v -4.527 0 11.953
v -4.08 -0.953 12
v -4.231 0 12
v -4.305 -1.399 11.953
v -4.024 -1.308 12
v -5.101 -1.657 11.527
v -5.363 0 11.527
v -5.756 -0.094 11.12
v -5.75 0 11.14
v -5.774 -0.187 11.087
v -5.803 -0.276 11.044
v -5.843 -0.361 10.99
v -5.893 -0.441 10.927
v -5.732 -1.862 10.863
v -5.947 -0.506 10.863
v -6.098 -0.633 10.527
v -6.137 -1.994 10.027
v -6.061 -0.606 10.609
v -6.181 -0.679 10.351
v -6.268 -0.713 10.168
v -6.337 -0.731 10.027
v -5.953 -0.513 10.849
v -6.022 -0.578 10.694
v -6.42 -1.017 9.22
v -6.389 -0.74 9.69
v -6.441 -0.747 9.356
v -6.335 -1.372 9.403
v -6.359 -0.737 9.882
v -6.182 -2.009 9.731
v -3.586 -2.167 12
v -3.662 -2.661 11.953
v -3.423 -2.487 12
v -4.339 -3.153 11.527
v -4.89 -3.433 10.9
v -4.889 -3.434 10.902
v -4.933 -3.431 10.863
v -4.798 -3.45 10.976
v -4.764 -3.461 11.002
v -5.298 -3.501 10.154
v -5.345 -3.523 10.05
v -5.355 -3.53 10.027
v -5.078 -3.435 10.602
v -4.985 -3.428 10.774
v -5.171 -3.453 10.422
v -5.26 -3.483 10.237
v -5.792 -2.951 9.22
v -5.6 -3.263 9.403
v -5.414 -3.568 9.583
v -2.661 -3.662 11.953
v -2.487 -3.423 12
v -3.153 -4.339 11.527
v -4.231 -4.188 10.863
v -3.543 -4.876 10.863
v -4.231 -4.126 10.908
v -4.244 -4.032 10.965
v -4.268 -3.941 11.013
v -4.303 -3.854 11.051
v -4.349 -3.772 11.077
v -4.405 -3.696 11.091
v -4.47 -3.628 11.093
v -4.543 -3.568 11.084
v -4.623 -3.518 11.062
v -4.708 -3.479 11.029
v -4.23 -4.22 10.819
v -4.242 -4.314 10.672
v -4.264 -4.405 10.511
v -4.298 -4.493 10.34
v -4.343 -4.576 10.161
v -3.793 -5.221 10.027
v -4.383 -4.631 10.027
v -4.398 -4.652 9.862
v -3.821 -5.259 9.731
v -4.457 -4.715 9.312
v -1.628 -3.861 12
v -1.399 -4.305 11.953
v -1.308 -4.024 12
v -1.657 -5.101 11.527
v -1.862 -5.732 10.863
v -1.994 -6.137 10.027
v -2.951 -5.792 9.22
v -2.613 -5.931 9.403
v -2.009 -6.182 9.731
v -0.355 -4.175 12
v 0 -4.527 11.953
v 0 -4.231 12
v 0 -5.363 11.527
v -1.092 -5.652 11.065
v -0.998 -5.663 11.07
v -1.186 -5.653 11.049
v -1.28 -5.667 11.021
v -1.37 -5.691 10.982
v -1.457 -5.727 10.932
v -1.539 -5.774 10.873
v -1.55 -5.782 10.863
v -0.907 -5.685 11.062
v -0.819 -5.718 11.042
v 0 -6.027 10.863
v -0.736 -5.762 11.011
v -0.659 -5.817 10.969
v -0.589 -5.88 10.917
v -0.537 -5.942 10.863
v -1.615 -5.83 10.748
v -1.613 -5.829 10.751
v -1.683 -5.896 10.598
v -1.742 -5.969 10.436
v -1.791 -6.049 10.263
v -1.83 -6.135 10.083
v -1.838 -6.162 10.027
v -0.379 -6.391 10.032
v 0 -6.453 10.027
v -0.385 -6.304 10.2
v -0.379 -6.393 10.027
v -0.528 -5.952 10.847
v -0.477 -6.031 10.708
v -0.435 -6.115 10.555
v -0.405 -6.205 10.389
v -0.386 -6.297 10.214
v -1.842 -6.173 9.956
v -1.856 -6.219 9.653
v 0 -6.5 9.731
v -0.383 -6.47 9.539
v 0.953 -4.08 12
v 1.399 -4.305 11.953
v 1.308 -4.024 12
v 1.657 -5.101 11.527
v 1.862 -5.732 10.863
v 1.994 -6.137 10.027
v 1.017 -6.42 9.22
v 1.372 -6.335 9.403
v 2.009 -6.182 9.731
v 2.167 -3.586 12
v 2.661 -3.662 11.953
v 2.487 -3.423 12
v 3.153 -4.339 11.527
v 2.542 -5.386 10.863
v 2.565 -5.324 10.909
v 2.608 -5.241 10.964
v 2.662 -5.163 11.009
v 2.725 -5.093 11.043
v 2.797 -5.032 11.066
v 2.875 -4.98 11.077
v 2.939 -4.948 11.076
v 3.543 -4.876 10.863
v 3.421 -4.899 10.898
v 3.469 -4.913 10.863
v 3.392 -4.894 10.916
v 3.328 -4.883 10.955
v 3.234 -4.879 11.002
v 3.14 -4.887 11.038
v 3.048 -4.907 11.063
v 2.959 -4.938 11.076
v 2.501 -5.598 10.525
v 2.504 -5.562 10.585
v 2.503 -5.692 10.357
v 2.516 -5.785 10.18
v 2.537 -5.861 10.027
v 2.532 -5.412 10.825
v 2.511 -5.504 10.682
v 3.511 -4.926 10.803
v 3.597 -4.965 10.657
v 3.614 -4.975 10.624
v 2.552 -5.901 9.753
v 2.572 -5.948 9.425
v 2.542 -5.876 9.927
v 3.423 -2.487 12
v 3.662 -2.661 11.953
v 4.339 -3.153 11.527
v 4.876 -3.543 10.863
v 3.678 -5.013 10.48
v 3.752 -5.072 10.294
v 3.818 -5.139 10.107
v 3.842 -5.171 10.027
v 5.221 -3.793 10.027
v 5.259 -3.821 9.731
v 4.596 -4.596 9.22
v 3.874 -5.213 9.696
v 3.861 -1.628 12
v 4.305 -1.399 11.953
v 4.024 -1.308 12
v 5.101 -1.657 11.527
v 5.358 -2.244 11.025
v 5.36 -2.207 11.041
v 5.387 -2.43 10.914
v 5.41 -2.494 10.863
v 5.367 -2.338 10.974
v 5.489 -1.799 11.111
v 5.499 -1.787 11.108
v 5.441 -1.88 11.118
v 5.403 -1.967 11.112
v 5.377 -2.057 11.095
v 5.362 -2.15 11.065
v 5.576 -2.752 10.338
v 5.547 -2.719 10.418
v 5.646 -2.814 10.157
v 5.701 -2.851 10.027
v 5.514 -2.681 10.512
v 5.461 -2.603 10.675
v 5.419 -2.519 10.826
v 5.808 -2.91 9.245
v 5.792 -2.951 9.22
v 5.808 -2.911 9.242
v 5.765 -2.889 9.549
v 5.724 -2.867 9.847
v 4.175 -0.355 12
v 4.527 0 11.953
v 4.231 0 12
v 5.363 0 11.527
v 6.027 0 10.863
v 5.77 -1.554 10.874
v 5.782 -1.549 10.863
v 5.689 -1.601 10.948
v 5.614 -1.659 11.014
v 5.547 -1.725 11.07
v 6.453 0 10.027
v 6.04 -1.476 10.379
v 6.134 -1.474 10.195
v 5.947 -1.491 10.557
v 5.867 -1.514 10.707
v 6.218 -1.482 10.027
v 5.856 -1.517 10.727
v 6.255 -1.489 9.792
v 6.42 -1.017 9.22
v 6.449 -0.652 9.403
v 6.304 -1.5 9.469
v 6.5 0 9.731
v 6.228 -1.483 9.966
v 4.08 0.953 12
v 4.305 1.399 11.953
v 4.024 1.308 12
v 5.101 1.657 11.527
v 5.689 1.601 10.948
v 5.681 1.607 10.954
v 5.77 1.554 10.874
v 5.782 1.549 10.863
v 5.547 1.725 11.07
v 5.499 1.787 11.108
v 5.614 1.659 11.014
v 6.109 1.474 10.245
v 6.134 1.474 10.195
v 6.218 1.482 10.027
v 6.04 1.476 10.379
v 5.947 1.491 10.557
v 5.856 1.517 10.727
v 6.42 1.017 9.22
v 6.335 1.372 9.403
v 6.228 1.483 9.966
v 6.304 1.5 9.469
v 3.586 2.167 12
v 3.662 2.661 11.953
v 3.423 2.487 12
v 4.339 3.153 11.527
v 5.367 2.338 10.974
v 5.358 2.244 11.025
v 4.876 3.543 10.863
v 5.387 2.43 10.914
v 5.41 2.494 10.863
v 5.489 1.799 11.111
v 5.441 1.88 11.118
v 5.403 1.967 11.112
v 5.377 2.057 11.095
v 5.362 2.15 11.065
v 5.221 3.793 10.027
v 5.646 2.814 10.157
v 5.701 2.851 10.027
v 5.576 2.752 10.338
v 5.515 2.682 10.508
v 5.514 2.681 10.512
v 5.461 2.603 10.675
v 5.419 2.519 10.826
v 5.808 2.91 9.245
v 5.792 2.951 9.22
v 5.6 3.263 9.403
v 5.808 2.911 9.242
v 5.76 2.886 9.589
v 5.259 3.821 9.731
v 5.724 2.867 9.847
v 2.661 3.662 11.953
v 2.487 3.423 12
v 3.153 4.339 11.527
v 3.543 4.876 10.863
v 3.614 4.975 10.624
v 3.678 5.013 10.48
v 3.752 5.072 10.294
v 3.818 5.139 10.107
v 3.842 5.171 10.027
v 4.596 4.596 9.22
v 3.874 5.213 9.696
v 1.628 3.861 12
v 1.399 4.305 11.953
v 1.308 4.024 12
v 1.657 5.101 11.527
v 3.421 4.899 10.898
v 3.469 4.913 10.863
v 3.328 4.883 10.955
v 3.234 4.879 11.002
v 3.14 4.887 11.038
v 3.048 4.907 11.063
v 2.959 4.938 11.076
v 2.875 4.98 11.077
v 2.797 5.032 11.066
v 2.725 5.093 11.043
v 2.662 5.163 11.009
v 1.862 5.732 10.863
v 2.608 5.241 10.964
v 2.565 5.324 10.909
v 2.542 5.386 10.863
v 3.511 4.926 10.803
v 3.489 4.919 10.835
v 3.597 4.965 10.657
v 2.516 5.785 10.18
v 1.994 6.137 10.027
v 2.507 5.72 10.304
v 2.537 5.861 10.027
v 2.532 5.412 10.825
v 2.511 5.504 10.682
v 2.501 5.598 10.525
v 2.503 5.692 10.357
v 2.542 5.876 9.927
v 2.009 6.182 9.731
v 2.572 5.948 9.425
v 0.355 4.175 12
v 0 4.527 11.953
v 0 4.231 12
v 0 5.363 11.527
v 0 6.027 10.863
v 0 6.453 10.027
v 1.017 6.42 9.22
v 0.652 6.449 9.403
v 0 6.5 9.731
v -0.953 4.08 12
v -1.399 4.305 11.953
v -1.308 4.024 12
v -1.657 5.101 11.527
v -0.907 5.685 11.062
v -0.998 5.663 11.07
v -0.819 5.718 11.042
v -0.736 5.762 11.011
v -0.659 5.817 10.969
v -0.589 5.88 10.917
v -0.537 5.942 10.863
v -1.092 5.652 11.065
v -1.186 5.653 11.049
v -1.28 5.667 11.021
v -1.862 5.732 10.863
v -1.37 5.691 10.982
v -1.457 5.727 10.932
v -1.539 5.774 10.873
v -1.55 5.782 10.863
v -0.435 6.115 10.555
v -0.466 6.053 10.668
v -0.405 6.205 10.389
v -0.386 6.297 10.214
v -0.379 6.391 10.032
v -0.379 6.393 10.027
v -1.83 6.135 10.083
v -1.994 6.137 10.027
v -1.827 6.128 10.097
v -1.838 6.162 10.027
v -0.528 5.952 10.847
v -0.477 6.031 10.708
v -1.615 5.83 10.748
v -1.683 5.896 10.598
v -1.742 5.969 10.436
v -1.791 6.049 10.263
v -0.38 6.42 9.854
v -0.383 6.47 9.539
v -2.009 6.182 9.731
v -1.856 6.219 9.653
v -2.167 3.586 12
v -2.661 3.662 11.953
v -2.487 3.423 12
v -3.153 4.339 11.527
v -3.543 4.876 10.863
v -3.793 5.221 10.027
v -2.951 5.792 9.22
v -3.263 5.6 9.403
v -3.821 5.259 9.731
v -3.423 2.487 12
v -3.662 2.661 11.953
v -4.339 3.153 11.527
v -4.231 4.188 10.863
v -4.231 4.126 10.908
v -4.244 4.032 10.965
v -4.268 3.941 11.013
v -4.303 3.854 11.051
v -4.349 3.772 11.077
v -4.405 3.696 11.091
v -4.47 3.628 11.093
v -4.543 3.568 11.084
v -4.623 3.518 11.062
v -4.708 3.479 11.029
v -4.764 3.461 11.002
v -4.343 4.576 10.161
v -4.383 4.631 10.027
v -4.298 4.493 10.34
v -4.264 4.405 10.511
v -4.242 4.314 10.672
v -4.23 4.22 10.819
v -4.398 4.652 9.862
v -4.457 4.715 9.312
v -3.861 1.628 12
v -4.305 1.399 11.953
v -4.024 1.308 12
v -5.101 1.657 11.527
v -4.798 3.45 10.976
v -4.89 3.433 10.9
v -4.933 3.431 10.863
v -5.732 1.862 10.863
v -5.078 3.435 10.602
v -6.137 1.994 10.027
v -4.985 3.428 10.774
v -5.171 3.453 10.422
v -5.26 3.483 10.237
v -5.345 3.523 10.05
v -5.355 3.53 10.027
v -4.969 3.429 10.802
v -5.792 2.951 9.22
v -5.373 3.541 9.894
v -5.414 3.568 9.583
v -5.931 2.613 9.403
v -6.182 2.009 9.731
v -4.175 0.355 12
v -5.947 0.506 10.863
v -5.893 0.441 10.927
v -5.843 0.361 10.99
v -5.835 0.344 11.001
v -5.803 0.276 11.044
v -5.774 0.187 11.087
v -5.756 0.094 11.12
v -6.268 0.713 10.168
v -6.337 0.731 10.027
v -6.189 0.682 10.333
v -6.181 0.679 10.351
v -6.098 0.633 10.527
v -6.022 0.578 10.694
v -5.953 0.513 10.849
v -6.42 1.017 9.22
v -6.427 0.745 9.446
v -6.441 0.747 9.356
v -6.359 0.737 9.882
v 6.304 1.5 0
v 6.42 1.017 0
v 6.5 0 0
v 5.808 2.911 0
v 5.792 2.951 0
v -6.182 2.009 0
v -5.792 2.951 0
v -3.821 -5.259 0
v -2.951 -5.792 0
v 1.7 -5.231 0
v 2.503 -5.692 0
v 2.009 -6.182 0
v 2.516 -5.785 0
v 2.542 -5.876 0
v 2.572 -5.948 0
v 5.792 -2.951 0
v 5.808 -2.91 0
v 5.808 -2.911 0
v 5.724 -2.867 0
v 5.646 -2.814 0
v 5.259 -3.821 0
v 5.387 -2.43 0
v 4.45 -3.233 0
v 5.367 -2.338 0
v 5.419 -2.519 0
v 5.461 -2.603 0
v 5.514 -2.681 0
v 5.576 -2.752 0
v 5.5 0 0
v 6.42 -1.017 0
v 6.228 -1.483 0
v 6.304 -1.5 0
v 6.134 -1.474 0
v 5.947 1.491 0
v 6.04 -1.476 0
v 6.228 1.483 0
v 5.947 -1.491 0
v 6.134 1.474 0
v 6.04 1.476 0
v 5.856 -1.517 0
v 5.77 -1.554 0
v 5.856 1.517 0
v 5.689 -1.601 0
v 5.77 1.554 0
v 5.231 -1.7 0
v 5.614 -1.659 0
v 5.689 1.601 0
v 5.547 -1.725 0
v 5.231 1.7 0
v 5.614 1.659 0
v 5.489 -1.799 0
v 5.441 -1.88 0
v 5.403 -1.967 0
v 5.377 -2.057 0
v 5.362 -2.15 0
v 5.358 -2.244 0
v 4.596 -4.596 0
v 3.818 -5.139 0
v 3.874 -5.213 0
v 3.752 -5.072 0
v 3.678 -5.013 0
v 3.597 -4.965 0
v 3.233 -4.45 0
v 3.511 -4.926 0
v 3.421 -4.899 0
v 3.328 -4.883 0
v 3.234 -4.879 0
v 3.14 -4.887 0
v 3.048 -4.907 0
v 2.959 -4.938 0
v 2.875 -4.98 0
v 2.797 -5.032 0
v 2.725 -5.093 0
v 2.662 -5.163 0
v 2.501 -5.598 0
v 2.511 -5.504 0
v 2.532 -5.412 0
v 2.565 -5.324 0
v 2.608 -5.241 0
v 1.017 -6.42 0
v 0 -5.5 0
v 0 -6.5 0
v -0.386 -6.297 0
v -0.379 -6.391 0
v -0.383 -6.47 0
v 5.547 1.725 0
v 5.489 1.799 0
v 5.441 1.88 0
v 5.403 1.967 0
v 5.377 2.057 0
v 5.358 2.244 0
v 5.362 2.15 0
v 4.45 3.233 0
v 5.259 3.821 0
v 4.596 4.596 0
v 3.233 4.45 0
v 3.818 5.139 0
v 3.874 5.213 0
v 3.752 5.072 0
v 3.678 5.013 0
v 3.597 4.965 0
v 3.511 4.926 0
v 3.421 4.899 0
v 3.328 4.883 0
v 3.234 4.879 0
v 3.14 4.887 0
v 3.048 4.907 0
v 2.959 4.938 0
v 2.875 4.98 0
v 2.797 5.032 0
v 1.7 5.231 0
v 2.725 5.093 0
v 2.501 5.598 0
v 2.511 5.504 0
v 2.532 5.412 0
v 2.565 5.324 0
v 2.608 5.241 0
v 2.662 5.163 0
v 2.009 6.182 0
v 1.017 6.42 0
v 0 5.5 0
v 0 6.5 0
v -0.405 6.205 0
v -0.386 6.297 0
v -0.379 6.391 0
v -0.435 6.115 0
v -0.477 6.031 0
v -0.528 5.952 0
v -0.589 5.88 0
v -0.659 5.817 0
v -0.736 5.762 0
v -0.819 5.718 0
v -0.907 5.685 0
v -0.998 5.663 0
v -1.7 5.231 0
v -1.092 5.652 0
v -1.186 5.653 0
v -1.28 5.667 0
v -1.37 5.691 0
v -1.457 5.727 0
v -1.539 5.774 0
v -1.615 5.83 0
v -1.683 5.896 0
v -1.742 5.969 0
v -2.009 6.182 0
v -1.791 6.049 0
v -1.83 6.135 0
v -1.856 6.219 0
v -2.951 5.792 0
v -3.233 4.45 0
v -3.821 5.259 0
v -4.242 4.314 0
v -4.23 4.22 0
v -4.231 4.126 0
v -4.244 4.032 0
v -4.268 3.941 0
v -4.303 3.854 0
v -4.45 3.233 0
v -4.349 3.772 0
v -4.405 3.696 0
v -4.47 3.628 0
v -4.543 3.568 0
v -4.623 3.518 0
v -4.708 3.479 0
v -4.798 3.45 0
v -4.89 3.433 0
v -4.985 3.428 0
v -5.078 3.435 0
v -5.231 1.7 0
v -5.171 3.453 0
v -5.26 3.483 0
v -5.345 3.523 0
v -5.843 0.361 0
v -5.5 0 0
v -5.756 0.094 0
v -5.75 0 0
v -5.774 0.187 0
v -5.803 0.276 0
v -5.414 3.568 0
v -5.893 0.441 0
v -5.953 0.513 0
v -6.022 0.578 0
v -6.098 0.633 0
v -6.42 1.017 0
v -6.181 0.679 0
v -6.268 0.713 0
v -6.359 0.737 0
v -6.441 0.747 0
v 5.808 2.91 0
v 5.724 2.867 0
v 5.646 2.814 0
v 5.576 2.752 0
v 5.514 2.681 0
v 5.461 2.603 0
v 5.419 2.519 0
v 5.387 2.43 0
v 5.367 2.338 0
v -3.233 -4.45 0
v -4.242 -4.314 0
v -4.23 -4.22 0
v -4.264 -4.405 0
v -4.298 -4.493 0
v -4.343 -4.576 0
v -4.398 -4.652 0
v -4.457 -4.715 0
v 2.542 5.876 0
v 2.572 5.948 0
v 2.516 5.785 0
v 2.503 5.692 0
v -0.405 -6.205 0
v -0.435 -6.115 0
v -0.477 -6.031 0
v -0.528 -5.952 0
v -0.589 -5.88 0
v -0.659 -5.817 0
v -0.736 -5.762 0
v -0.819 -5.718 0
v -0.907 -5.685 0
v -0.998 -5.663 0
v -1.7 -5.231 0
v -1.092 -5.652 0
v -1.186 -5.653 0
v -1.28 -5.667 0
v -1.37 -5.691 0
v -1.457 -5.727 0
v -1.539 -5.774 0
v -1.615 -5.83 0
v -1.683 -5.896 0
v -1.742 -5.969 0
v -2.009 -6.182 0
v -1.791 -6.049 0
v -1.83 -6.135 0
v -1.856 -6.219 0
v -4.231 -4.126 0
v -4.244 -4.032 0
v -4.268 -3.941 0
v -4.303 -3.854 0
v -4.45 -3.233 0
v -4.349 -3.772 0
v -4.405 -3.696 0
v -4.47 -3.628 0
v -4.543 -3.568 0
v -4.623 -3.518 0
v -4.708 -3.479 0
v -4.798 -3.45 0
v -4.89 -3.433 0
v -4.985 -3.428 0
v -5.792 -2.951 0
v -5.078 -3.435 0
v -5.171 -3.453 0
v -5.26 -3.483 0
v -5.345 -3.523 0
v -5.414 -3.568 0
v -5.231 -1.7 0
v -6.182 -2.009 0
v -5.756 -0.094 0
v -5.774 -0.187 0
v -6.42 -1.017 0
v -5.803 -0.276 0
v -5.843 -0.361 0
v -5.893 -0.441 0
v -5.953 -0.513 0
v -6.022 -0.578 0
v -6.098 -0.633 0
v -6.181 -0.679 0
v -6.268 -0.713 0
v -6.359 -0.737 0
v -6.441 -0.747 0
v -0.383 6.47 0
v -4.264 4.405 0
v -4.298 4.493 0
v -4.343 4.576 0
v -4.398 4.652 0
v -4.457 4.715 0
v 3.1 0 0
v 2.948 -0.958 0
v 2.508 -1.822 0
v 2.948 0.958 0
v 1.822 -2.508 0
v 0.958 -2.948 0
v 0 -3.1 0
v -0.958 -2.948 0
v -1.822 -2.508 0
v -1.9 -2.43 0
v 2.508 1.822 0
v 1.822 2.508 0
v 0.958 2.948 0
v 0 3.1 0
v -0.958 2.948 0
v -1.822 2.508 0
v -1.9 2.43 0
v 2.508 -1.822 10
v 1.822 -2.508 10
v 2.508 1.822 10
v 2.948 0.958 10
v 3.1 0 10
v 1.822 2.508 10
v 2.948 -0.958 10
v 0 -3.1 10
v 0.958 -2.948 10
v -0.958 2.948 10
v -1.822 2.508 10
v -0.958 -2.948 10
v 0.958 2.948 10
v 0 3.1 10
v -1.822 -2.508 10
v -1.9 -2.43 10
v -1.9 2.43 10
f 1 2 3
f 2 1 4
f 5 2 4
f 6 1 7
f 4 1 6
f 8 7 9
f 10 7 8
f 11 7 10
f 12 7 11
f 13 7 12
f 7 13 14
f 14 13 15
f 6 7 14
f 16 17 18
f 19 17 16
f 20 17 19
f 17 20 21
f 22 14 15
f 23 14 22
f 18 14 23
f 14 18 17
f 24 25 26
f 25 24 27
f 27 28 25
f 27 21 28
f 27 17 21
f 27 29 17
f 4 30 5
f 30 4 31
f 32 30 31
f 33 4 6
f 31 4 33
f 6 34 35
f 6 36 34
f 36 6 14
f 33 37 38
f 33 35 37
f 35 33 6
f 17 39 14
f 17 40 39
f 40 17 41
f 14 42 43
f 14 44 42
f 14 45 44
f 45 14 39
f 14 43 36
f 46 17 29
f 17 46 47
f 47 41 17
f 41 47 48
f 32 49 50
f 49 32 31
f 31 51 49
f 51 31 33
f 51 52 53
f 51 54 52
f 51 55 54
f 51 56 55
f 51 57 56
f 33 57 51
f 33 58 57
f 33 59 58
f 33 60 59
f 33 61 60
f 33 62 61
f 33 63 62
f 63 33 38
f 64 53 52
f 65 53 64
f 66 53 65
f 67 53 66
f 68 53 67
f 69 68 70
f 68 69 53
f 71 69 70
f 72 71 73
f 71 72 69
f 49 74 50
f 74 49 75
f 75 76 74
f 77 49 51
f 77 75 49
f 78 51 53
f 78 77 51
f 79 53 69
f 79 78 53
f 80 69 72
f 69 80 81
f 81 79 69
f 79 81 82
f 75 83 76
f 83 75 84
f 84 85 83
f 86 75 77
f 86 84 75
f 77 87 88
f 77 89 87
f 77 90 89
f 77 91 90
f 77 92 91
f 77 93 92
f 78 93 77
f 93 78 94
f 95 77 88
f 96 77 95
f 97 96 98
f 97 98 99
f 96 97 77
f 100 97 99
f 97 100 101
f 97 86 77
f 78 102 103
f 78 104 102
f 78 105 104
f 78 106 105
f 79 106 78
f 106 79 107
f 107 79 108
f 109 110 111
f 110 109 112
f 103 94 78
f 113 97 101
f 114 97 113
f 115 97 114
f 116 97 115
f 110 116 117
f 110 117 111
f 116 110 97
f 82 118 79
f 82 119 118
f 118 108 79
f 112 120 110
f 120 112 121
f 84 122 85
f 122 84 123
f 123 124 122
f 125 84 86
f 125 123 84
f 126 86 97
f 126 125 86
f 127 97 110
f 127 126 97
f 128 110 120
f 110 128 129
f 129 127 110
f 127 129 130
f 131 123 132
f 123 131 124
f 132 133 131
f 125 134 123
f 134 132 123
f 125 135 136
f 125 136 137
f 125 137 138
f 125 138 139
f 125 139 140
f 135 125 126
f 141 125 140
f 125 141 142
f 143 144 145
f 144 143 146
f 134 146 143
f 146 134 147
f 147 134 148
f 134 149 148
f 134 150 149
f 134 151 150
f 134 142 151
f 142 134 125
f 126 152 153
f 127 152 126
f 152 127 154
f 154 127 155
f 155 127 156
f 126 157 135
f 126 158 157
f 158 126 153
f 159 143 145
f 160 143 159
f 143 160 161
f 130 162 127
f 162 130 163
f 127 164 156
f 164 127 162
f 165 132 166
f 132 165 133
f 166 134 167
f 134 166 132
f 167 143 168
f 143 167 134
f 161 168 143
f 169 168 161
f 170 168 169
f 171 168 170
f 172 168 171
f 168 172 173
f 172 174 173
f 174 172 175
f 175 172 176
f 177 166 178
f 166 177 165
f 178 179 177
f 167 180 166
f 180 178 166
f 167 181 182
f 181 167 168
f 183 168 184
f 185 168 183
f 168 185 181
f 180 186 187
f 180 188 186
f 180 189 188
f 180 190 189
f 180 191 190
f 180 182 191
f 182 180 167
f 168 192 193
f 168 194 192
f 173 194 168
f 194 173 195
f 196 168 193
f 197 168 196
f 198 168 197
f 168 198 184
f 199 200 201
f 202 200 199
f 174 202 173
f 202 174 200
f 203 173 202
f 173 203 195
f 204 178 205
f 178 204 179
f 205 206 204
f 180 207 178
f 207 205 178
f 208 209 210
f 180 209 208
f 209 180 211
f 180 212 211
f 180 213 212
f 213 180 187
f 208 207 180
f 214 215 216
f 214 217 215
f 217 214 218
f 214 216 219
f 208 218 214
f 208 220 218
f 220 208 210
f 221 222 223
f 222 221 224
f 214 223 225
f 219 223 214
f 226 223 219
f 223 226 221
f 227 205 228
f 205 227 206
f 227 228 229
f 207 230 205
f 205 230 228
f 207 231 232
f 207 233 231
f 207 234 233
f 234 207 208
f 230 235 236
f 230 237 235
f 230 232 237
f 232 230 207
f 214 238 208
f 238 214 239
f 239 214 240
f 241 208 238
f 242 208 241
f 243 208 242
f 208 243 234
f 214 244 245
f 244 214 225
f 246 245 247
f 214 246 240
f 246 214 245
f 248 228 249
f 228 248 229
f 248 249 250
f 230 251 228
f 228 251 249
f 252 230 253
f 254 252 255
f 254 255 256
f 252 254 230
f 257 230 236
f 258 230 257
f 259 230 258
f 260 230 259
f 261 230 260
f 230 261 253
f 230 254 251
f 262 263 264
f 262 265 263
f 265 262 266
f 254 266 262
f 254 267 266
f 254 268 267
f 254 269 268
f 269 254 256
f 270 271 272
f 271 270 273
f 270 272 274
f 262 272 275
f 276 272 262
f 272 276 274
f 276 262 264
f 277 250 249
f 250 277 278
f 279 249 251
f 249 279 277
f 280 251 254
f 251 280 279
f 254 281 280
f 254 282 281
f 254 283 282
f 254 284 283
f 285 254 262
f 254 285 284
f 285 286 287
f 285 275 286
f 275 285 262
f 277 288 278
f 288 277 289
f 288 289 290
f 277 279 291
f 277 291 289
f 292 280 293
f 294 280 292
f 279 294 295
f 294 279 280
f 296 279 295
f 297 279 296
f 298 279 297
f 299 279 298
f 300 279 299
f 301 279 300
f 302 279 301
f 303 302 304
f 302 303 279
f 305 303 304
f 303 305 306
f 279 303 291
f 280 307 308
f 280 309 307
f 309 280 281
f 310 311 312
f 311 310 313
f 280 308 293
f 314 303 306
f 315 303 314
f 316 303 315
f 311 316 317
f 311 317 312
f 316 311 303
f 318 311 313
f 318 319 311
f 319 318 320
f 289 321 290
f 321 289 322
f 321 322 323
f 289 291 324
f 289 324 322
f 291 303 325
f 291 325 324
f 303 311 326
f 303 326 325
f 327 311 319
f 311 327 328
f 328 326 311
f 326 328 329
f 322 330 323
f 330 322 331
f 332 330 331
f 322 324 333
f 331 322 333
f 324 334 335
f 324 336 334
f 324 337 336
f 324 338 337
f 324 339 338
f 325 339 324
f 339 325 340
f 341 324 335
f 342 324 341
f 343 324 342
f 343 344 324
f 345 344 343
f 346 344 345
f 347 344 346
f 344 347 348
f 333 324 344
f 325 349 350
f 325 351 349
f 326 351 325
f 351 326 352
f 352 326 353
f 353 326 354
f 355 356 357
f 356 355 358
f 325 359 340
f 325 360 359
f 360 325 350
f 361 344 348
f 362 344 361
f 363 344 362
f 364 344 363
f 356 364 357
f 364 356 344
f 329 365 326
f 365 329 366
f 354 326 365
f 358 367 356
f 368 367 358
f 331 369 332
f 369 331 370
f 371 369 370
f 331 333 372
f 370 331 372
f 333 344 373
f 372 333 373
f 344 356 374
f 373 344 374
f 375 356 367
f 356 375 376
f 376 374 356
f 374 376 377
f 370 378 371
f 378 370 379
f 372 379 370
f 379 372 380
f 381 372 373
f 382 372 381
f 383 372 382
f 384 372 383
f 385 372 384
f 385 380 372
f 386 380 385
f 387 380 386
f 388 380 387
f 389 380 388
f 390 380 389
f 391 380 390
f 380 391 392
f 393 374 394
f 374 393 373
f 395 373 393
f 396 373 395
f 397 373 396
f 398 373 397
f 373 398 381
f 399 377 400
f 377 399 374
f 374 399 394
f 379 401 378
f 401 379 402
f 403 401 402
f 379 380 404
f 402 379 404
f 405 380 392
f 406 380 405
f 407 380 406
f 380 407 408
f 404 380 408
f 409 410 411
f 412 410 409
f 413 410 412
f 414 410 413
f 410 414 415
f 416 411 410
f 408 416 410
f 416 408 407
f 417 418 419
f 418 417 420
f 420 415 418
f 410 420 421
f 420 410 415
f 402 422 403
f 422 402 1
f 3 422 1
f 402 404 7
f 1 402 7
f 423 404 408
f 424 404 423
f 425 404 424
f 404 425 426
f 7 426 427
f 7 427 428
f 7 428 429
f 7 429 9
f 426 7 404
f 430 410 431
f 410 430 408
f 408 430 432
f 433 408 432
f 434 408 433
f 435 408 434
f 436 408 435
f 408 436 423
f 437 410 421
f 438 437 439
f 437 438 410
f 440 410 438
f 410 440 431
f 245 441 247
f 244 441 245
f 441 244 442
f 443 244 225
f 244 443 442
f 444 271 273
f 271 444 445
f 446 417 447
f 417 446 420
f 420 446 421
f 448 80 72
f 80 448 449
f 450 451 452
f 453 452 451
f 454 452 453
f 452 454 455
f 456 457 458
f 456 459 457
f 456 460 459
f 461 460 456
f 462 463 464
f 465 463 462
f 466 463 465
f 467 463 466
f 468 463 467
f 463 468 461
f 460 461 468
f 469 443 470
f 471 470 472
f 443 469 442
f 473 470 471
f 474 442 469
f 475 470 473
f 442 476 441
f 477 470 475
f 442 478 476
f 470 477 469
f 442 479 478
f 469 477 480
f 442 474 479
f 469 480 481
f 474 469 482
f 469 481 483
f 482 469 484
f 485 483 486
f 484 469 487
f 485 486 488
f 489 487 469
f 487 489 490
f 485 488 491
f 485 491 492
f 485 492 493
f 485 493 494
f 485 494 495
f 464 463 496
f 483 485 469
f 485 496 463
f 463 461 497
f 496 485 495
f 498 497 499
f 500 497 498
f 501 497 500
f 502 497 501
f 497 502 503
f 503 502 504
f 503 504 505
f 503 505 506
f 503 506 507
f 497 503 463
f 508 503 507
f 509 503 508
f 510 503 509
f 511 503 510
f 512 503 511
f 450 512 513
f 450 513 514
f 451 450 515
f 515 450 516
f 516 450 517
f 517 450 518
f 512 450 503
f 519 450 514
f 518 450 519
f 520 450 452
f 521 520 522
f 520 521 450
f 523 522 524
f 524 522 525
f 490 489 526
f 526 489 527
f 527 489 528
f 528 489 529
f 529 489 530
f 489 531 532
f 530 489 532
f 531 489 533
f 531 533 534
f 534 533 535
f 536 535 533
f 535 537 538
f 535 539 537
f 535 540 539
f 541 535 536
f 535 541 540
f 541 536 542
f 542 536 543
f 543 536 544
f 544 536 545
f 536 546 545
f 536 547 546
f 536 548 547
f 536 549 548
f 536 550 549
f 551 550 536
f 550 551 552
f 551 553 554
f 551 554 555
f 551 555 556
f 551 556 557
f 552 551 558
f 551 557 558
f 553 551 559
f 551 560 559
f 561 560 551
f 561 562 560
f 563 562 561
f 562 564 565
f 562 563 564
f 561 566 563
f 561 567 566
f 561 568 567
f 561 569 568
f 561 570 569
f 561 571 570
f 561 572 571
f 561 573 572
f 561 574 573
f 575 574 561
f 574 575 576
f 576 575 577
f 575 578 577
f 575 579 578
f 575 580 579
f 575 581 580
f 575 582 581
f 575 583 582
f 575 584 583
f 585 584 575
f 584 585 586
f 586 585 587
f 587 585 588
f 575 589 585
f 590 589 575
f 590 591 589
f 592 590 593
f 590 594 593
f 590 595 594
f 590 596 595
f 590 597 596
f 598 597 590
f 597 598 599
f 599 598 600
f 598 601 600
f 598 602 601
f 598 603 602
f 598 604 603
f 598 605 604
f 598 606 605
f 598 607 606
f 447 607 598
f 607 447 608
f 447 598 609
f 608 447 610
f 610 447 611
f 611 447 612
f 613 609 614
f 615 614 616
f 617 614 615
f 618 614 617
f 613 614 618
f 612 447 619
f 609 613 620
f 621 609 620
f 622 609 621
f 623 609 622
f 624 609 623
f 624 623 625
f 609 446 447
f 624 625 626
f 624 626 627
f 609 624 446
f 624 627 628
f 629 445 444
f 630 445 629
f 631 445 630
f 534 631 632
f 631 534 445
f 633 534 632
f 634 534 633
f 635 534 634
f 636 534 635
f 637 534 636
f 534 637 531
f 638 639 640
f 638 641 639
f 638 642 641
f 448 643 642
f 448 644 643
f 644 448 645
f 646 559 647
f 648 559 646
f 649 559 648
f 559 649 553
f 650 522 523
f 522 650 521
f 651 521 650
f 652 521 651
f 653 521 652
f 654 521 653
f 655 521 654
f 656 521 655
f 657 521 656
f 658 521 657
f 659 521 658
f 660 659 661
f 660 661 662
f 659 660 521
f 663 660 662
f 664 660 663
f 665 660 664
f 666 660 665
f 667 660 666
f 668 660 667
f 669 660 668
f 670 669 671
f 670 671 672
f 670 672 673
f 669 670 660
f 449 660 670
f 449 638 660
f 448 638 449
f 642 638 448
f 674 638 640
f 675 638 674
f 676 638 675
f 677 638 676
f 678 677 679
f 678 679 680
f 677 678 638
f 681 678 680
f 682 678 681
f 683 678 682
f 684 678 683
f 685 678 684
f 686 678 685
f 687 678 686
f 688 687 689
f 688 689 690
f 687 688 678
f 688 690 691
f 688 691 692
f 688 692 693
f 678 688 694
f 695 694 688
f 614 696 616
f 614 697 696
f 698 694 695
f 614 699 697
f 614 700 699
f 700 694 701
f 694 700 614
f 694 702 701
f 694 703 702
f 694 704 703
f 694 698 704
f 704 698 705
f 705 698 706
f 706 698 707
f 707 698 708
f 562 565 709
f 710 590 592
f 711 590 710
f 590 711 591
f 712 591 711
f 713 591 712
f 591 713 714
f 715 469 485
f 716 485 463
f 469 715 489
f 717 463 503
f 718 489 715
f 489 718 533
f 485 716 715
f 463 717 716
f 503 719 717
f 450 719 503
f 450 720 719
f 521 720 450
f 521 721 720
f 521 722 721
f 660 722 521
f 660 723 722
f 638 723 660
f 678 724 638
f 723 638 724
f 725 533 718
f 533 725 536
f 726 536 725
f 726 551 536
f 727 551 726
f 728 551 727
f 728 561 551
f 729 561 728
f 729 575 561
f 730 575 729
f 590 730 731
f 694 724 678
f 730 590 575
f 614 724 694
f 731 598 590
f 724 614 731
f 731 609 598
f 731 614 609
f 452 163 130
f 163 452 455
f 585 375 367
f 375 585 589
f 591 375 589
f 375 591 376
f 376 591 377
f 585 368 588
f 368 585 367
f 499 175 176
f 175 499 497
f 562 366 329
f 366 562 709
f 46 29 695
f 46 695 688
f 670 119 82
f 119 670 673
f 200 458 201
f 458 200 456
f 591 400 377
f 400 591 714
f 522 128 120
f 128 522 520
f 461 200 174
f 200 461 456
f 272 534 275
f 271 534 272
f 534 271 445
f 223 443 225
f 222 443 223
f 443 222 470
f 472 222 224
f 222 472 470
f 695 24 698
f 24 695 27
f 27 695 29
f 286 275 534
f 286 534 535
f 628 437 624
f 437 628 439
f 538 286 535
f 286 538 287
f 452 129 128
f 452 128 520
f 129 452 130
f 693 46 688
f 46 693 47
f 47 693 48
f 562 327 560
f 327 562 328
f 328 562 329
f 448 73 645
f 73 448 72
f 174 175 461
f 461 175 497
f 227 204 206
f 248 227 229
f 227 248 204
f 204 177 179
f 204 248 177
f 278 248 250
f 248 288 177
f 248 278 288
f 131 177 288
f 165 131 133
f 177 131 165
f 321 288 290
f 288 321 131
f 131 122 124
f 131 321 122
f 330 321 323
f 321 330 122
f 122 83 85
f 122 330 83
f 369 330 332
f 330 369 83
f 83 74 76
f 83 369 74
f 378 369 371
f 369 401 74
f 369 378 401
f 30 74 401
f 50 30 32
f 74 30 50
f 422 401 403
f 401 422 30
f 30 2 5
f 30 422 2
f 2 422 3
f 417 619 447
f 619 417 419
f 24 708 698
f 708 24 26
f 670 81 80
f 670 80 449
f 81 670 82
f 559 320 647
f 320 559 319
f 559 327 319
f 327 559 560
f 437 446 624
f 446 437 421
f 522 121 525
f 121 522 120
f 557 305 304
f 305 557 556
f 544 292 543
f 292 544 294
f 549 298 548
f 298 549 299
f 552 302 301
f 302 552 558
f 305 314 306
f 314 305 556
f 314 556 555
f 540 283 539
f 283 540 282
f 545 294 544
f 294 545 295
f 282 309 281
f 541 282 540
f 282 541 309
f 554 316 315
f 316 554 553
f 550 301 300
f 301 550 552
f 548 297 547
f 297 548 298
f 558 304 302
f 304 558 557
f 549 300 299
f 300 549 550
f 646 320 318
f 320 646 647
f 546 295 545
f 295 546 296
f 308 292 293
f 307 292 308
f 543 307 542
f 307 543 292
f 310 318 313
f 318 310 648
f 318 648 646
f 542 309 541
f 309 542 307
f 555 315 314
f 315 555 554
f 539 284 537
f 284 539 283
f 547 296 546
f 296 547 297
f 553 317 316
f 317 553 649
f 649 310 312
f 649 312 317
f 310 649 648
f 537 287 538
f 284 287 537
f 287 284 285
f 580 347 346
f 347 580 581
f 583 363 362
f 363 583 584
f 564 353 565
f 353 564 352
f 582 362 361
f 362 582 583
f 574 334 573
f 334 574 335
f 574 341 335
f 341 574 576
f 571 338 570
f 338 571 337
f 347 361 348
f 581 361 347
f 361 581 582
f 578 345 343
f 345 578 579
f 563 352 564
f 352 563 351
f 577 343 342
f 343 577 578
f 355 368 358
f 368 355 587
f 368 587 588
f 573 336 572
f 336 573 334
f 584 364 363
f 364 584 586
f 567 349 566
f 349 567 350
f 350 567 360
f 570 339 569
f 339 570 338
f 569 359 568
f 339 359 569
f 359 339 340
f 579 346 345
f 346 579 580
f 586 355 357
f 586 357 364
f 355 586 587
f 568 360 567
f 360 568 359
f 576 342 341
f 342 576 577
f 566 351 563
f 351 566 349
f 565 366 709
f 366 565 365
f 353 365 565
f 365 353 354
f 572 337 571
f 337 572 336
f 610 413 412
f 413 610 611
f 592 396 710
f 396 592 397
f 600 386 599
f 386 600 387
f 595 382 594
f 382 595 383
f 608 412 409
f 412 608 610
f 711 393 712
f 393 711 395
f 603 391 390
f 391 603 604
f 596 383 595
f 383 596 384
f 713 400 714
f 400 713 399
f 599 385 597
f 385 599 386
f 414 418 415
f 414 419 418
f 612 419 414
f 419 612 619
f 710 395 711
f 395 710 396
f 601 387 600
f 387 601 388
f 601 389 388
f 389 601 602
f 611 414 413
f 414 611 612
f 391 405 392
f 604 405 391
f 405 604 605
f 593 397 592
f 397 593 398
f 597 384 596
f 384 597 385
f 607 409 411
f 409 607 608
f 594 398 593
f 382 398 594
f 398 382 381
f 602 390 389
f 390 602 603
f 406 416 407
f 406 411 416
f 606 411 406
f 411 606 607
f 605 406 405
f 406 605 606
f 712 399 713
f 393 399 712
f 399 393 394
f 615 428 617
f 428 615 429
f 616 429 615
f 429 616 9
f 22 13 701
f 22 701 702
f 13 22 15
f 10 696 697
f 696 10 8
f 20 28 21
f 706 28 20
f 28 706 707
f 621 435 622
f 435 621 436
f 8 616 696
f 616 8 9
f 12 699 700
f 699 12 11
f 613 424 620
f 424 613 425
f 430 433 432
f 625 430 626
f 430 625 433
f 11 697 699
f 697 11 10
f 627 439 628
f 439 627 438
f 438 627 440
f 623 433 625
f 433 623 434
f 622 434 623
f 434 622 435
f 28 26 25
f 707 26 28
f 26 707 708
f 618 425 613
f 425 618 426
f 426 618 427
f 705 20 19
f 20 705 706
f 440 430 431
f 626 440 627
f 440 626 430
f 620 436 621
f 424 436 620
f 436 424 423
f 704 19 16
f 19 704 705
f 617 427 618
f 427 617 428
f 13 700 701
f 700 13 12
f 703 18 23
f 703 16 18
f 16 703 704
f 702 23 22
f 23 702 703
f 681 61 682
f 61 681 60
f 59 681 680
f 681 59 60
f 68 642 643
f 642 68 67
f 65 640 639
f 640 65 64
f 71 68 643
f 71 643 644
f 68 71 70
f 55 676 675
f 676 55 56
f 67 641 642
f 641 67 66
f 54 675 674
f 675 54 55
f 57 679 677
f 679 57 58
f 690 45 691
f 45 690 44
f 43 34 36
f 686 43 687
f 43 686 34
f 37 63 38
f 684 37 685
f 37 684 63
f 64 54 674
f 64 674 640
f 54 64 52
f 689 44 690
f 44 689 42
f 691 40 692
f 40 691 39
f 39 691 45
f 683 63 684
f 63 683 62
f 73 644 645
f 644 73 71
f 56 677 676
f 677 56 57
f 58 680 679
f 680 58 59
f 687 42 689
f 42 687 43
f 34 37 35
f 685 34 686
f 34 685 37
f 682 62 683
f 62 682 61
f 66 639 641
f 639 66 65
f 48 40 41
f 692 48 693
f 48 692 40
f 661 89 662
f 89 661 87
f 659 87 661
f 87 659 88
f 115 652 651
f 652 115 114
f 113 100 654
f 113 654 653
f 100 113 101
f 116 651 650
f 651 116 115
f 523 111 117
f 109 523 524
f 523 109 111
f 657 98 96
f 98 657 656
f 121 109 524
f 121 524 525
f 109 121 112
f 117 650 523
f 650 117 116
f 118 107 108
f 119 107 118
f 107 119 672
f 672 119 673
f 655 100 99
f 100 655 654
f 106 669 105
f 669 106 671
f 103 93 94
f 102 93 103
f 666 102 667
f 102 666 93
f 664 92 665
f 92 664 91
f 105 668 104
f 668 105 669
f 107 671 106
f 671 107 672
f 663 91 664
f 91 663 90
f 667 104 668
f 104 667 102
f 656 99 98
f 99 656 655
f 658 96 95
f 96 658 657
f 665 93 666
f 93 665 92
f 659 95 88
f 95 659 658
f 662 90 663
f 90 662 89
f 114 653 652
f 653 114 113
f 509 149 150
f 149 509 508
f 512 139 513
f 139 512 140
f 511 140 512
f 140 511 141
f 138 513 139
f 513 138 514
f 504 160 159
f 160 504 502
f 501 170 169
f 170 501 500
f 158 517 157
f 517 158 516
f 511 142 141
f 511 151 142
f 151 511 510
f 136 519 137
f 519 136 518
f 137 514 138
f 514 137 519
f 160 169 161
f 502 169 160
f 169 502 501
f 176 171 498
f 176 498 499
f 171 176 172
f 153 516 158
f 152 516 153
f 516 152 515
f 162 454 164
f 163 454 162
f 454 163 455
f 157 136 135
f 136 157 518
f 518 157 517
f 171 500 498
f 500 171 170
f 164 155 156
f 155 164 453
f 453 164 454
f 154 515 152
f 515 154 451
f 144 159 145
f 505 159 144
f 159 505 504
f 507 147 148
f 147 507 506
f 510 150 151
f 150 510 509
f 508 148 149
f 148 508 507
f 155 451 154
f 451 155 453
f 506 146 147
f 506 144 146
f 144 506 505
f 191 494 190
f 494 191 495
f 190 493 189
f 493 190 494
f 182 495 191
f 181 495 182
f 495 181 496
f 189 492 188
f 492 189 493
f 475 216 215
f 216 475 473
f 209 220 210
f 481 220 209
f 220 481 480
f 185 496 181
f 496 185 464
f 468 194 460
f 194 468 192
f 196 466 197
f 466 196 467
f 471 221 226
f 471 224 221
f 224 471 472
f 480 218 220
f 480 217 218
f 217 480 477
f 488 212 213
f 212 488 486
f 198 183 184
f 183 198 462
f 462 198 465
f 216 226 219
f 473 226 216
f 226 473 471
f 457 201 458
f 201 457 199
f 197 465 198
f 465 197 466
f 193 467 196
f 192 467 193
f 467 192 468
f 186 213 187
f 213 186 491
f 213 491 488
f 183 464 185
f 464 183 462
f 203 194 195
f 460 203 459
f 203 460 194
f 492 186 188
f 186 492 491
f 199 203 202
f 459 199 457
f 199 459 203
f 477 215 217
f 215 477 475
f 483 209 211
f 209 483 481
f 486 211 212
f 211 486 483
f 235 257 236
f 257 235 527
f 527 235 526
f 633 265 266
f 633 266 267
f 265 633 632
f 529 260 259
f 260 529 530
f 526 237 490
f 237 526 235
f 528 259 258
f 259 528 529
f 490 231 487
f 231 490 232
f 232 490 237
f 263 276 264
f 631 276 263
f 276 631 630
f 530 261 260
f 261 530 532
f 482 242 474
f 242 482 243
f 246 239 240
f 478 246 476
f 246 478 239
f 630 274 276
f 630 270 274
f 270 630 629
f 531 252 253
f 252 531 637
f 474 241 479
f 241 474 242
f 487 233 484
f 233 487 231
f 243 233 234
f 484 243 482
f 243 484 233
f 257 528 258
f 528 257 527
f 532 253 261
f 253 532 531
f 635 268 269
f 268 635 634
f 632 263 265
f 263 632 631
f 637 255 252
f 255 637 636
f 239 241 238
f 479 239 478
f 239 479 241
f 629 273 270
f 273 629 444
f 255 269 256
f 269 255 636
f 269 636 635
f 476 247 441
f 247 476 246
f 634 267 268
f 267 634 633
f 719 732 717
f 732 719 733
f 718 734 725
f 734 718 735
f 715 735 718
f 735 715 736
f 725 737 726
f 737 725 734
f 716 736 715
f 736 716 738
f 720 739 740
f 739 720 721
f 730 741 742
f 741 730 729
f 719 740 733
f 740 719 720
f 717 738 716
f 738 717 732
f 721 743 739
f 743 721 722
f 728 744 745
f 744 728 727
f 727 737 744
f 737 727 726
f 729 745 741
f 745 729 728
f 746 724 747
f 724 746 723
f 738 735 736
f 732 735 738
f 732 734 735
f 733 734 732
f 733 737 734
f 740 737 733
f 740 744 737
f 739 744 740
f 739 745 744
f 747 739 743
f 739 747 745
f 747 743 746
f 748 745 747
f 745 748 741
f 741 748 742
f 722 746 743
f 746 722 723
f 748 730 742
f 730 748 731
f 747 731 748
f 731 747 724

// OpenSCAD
/*

Parametric Potentiometer Knob Generator
version 1.4
2013 Steve Cooley
http://sc-fa.com
http://beatseqr.com
http://hapticsynapses.com

parametric potentiometer knob generator by steve cooley is licensed under a Creative Commons Attribution-NonCommercial-ShareAlike 3.0 Unported License. Based on a work at sc-fa.com. Permissions beyond the scope of this license may be available at http://sc-fa.com/blog/contact.

view terms of the license here:
http://creativecommons.org/licenses/by-nc-sa/3.0/


version history
---------------
1.4 2013-07-16 added an additive OR subtractive pill shaped indicator type
1.3 2013-04-01 updated for more awesome Thingiverse Customizer
1.2 2013-01-09 updated for Thingiverse Customizer
1.1 2012-04-12 fixed the arrow indicator code to be more robust and easier to adjust parameters for.
1.0 2012-03-?? initial release.


*/

/* [Physical attributes] */

bottom_spaceH=0;
bottom_spaceD=11;
layerH=0;

// All values are in Millimeters!  How big the top of the knob is:
01_knob_diameter_top = 13; //[10:100]
knob_radius_top = 01_knob_diameter_top / 2;

// How big the bottom of the knob is:
02_knob_diameter_bottom = 13; // [10:100]
knob_radius_bottom = 02_knob_diameter_bottom / 2;

// how tall the knob is:
03_knob_height = 12; // [5:50]
knob_height = 03_knob_height / 1;

// how smooth or geometric the knob is:
04_knob_smoothness = 40; // [3:40]
knob_smoothness = 04_knob_smoothness / 1;

// (measure the potentiometer shaft with calipers and remember to add a bit for shrinkage.)
05_shaft_diameter = 6.2; // this could be a slider if precision were available
shaft_radius = 05_shaft_diameter / 2;

// how much of the shaft the knob should allow space inside for:
06_shaft_height = 10; // [1:40]
shaft_height = 06_shaft_height / 1;

// higher is smoother
07_shaft_smoothness = 20; // [3:20]
shaft_smoothness = 07_shaft_smoothness / 1;

// some potentiometers have a flat surface on the shaft to allow for the use of a set screw.
08_shaft_hole_is_flatted = "true"; // [true,false]

// ignore if no flat is needed.
09_shaft_hole_flat_size = 5; // this could be a slider if precision were available
flat_size = 09_shaft_hole_flat_size / 1;

/* [Set screw] */

// some potentiometers need to have their knobs affixed with a set screw.
10_set_screw = "false"; //[true,false]

// in MM:
11_set_screw_diameter = 3; // [0:8]
set_screw_radius = 11_set_screw_diameter / 2;

// how deep into the knob, from the side:
12_set_screw_depth = 9; // [0:20]
set_screw_depth = 12_set_screw_depth / 1;

// from the top:
13_set_screw_height = 4; // [0:20]
set_screw_height = 13_set_screw_height / 1;

// higher is smoother:
14_quality_of_set_screw = 20; // [0:20]
quality_of_set_screw = 14_quality_of_set_screw / 1;

/* [Decorations] */

// thanks to http://www.iheartrobotics.com/ for the articles!
15_top_edge_smoothing = "true"; // [true,false]

// how big of a smoothing radius to apply
16_top_edge_smoothing_radius = 3.0; // [1:10]
smoothing_radius = 16_top_edge_smoothing_radius / 1;

// Number of facets for the rounding cylinder
17_top_edge_smoothing_smoothness = 20.0; // [1:40]
smooth = 17_top_edge_smoothing_smoothness / 1;

ct = -0.1 / 1; 							// circle translate? not sure.
circle_radius = knob_radius_top / 1;  	// just match the top edge radius
circle_height = 1 / 1; 					// actually.. I don't know what this does.
pad = 0.2 / 1;							// Padding to maintain manifold



/* [External indicator] */

// this is a corner edge of a cube sticking out of the cylinder at the bottom, you can use it instead of the arrow shaped cutout in the top if you like. Or both.
18_pointy_external_indicator = "false"; // [true,false]


// how tall should the indicator be, from the bottom:
19_pointy_external_indicator_height = 3; // [1:50]
pointy_external_indicator_height = 19_pointy_external_indicator_height / 1;

// how far out the indicator should poke out:
20_pointy_external_indicator_pokey_outey_ness = 1.0;
pointy_external_indicator_pokey_outey_ness = 20_pointy_external_indicator_pokey_outey_ness * 1;

pokey_outey_value = pointy_external_indicator_pokey_outey_ness - 1 - pad;
pokey_outey = [pokey_outey_value, pokey_outey_value,0];

// there's an arrow shaped hole you can have. There aren't a lot of controls for this.
// please feel free to improve on this script here.

/* [Pill-shaped indicator] */

// there's an arrow shape you can have in the top of the knob.
00_pill_indicator = "false"; // [true,false]

// add or subtract the pill shape?
00_pill_add_or_subtract = "add"; // [add,subtract]

// relative scale of the pill shape:
00_pill_scale = 1.0;

// height of the pill shape:
00_pill_height = 16.0;

// relative scale of length of the pill shape:
00_pill_length = 2.5;

// where to put the arrow, x:
00_pill_location_x = 0.0;

// where to put the arrow, y:
00_pill_location_y = 5.0;

// where to put the arrow, z:
00_pill_location_z = 0.0;

pill_translate = [00_pill_location_x,00_pill_location_y,00_pill_location_z];


/* [Internal Arrow indicator] */

// there's an arrow shape you can have in the top of the knob.
21_top_of_knob_arrow_indicator = "false"; // [true,false]

// scale the arrow head:
22_arrow_head_scale = 2.0;
arrow_scale_head = 22_arrow_head_scale / 1;

// scale the arrow shaft:
23_arrow_shaft_scale = 1.5;
arrow_scale_shaft = 23_arrow_shaft_scale / 1;

// how big the overall arrow indicator should be:
24_arrow_indicator_scale = 1.3;
arrow_indicator_scale = 24_arrow_indicator_scale / 1;

// where to put the arrow, x:
25_arrow_location_x = 0.0;

// where to put the arrow, y:
26_arrow_location_y = 1.0;

// where to put the arrow, z:
27_arrow_location_z = 16.0;

arrow_indicator_translate = [25_arrow_location_x,26_arrow_location_y,27_arrow_location_z];



/* [Sphere Indentations] */

// for spherical indentations, set the quantity, quality, size, and adjust the placement
28_indentations_sphere = "false"; // [true,false]

29_sphere_number_of_indentations = 12; // [1:50]
sphere_number_of_indentations = 29_sphere_number_of_indentations / 1;

30_sphere_quality_of_indentations = 40; // [1:100]
sphere_quality_of_indentations = 30_sphere_quality_of_indentations / 1;

31_size_of_sphere_indentations = 4; // [1:20]
size_of_sphere_indentations = 31_size_of_sphere_indentations / 1;

// the first number in this set moves the spheres in or out. smaller is closer to the middle
32_sphere_indentation_location_x = 12.0;

// the second number in this set moves the spheres left or right
33_sphere_indentation_location_y = 00.0;

// the third number in this set moves the speheres up or down
34_sphere_indentation_location_z = 15.0;

translation_of_sphere_indentations = [32_sphere_indentation_location_x,33_sphere_indentation_location_y,34_sphere_indentation_location_z];

// in case you are using an odd number of indentations, you way want to adjust the starting angle so that they align to the front or set screw locations.
35_sphere_indentation_starting_rotation = 30; // [-90:90]
sphere_starting_rotation = 35_sphere_indentation_starting_rotation / 1 + 90;

/* [Cylinder Indentations] */

// for cylinder indentations, set quantity, quality, radius, height, and placement
36_indentations_cylinder = "true"; // [true,false]

37_number_of_cylinder_indentations = 9; // [1:40]
cylinder_number_of_indentations = 37_number_of_cylinder_indentations / 1;

// higher is smoother:
38_smoothness_of_cylinder_indentations = 50; // [3:100]
cylinder_quality_of_indentations = 38_smoothness_of_cylinder_indentations / 1;

39_diameter_of_top_of_the_cylinder = 1.5; // [1:20]
radius_of_cylinder_indentations_top = 39_diameter_of_top_of_the_cylinder / 2;

40_diameter_of_bottom_of_the_cylinder = 1.5;  // [1:20]
radius_of_cylinder_indentations_bottom = 40_diameter_of_bottom_of_the_cylinder / 2;

41_height_of_cylinder_indentations = 15.0; // [0:40]
height_of_cylinder_indentations = 41_height_of_cylinder_indentations / 1;

// this moves the cylinders in or out from the center
42_position_of_cylinder_x = -0.0; //[-20:20]

// this moves the cylinders left or right
43_position_of_cylinder_y = 0.0; //[-20:20]

// this moves the cylinders up or down
44_position_of_cylinder_z = -5.0; //[-20:20]

translation_of_cylinder_indentations = [42_position_of_cylinder_x,43_position_of_cylinder_y,44_position_of_cylinder_z];

45_cylinder_starting_rotation = -30; // [-90:90]
cylinder_starting_rotation = 45_cylinder_starting_rotation / 1 - 90;


// these are some setup variables... you probably won't need to mess with them.
negative_knob_radius = knob_radius_bottom*-1;


// this is the main module. It calls the submodules.
make_the_knob();

module make_the_knob()
{
difference()
{
	union()
	{
	difference()
		{
		difference()
			{
		
			difference() 
				{
				difference() 
					{
					
					union()
						{
						
						difference()
							{
							// main cylinder
							cylinder(r1=knob_radius_bottom,r2=knob_radius_top,h=knob_height, $fn=knob_smoothness);
							
							smoothing();				
		
							}
				
						external_direction_indicator();	
						}
					
					}
					
				set_screw_hole();
				}
			
			if(00_pill_add_or_subtract == "subtract")
				{
				pill();
				}
			arrow_indicator();
			indentations();
			}
		
	}
	if(00_pill_add_or_subtract == "add")
							{
							pill();
							}
	
	}
shaft_hole();
bottom_space();    
}

}
module smoothing() {

// smoothing the top
				if(15_top_edge_smoothing == "true")
					{		
						translate([0,0,knob_height])
						rotate([180,0,0])
						difference() {
							rotate_extrude(convexity=10,  $fn = smooth)
							translate([circle_radius-ct-smoothing_radius+pad,ct-pad,0])
							square(smoothing_radius+pad,smoothing_radius+pad);
	
							rotate_extrude(convexity=10,  $fn = smooth)
							translate([circle_radius-ct-smoothing_radius,ct+smoothing_radius,0])
							circle(r=smoothing_radius,$fn=smooth);
							}	
					}
}

module external_direction_indicator() {

				if(18_pointy_external_indicator == "true")
						{
						
						
						// outer pointy indicator
						rotate([0,0,45])
						translate(pokey_outey)
						// cube size of 8 minimum to point out
						cube(size=[knob_radius_bottom,knob_radius_bottom,pointy_external_indicator_height],center=false);
						}

}

module shaft_hole() {
				// shaft hole
				difference()
					{
					
					// round shaft hole
					translate([ 0, 0, bottom_spaceH+layerH]) 
					cylinder(r=shaft_radius,h=shaft_height-bottom_spaceH, $fn=shaft_smoothness);
					
					if(08_shaft_hole_is_flatted  == "true")
						{
						// D shaft shape for shaft cutout
						rotate( [0,0,90]) 
						translate([-shaft_radius,-shaft_radius+flat_size,0]) 
						cube(size=[shaft_radius*2,shaft_radius*2,shaft_height-bottom_spaceH-layerH],center=false);
                        //cube(size=[flat_size,10,13],center=false);
						}
					}
}
module bottom_space() {
    translate([ 0, 0, -1]) 
	cylinder(d=bottom_spaceD,h=bottom_spaceH+1, $fn=shaft_smoothness);				
}

module set_screw_hole() {

			if(10_set_screw == "true")
				{
				// set screw hole
				rotate ([90,0,0])
				translate([ 0, set_screw_height, 1 ])
				cylinder(r=set_screw_radius,h=set_screw_depth, $fn=quality_of_set_screw);
				}
}

module arrow_indicator() {
		if(21_top_of_knob_arrow_indicator == "true")
			{
			translate(arrow_indicator_translate)
			// begin arrow top cutout
			// translate([(knob_radius/2),knob_height,knob_height])
			rotate([90,0,45])
			scale([arrow_indicator_scale*.3,arrow_indicator_scale*.3,arrow_indicator_scale*.3])
			union()
				{			  
				rotate([90,45,0])
				scale([arrow_scale_head,arrow_scale_head,1])
				cylinder(r=8, h=10, $fn=3, center=true);
				rotate([90,45,0])
				translate([-10,0,0])
				scale([arrow_scale_shaft,arrow_scale_shaft,1])
				cube(size=[15,10,10],center=true);
				}
			}
}

module indentations() {

if(28_indentations_sphere == "true")
			{
			for (z = [0:sphere_number_of_indentations]) 
				{
				rotate([0,0,sphere_starting_rotation+((360/sphere_number_of_indentations)*z)])
				translate(translation_of_sphere_indentations)
				sphere(size_of_sphere_indentations, $fn=sphere_quality_of_indentations); 
				}
			}
if(36_indentations_cylinder == "true")
			{
			for (z = [0:cylinder_number_of_indentations]) 
				{
				rotate([0,0,cylinder_starting_rotation+((360/cylinder_number_of_indentations)*z)])
				
				translate([negative_knob_radius,0,knob_height])
				translate(translation_of_cylinder_indentations)
				cylinder(r1=radius_of_cylinder_indentations_bottom, r2=radius_of_cylinder_indentations_top, h=height_of_cylinder_indentations, center=true, $fn=cylinder_quality_of_indentations); 
				}
			}
		}

module pill()
{

if(00_pill_indicator == "true")
	{

	translate(pill_translate)

	rotate([0,0,90])
		{
		union()
			{
			cylinder(00_pill_height,00_pill_scale,00_pill_scale, $fn=40);
			translate([0,-00_pill_scale,0])
				{
					cube([(00_pill_scale*2)*00_pill_length,00_pill_scale*2,00_pill_height]);
				}
			translate([(00_pill_scale*2)*00_pill_length,0,0])
				{
					cylinder(00_pill_height,00_pill_scale,00_pill_scale, $fn=40);
				}
			}
		}
	}
}
